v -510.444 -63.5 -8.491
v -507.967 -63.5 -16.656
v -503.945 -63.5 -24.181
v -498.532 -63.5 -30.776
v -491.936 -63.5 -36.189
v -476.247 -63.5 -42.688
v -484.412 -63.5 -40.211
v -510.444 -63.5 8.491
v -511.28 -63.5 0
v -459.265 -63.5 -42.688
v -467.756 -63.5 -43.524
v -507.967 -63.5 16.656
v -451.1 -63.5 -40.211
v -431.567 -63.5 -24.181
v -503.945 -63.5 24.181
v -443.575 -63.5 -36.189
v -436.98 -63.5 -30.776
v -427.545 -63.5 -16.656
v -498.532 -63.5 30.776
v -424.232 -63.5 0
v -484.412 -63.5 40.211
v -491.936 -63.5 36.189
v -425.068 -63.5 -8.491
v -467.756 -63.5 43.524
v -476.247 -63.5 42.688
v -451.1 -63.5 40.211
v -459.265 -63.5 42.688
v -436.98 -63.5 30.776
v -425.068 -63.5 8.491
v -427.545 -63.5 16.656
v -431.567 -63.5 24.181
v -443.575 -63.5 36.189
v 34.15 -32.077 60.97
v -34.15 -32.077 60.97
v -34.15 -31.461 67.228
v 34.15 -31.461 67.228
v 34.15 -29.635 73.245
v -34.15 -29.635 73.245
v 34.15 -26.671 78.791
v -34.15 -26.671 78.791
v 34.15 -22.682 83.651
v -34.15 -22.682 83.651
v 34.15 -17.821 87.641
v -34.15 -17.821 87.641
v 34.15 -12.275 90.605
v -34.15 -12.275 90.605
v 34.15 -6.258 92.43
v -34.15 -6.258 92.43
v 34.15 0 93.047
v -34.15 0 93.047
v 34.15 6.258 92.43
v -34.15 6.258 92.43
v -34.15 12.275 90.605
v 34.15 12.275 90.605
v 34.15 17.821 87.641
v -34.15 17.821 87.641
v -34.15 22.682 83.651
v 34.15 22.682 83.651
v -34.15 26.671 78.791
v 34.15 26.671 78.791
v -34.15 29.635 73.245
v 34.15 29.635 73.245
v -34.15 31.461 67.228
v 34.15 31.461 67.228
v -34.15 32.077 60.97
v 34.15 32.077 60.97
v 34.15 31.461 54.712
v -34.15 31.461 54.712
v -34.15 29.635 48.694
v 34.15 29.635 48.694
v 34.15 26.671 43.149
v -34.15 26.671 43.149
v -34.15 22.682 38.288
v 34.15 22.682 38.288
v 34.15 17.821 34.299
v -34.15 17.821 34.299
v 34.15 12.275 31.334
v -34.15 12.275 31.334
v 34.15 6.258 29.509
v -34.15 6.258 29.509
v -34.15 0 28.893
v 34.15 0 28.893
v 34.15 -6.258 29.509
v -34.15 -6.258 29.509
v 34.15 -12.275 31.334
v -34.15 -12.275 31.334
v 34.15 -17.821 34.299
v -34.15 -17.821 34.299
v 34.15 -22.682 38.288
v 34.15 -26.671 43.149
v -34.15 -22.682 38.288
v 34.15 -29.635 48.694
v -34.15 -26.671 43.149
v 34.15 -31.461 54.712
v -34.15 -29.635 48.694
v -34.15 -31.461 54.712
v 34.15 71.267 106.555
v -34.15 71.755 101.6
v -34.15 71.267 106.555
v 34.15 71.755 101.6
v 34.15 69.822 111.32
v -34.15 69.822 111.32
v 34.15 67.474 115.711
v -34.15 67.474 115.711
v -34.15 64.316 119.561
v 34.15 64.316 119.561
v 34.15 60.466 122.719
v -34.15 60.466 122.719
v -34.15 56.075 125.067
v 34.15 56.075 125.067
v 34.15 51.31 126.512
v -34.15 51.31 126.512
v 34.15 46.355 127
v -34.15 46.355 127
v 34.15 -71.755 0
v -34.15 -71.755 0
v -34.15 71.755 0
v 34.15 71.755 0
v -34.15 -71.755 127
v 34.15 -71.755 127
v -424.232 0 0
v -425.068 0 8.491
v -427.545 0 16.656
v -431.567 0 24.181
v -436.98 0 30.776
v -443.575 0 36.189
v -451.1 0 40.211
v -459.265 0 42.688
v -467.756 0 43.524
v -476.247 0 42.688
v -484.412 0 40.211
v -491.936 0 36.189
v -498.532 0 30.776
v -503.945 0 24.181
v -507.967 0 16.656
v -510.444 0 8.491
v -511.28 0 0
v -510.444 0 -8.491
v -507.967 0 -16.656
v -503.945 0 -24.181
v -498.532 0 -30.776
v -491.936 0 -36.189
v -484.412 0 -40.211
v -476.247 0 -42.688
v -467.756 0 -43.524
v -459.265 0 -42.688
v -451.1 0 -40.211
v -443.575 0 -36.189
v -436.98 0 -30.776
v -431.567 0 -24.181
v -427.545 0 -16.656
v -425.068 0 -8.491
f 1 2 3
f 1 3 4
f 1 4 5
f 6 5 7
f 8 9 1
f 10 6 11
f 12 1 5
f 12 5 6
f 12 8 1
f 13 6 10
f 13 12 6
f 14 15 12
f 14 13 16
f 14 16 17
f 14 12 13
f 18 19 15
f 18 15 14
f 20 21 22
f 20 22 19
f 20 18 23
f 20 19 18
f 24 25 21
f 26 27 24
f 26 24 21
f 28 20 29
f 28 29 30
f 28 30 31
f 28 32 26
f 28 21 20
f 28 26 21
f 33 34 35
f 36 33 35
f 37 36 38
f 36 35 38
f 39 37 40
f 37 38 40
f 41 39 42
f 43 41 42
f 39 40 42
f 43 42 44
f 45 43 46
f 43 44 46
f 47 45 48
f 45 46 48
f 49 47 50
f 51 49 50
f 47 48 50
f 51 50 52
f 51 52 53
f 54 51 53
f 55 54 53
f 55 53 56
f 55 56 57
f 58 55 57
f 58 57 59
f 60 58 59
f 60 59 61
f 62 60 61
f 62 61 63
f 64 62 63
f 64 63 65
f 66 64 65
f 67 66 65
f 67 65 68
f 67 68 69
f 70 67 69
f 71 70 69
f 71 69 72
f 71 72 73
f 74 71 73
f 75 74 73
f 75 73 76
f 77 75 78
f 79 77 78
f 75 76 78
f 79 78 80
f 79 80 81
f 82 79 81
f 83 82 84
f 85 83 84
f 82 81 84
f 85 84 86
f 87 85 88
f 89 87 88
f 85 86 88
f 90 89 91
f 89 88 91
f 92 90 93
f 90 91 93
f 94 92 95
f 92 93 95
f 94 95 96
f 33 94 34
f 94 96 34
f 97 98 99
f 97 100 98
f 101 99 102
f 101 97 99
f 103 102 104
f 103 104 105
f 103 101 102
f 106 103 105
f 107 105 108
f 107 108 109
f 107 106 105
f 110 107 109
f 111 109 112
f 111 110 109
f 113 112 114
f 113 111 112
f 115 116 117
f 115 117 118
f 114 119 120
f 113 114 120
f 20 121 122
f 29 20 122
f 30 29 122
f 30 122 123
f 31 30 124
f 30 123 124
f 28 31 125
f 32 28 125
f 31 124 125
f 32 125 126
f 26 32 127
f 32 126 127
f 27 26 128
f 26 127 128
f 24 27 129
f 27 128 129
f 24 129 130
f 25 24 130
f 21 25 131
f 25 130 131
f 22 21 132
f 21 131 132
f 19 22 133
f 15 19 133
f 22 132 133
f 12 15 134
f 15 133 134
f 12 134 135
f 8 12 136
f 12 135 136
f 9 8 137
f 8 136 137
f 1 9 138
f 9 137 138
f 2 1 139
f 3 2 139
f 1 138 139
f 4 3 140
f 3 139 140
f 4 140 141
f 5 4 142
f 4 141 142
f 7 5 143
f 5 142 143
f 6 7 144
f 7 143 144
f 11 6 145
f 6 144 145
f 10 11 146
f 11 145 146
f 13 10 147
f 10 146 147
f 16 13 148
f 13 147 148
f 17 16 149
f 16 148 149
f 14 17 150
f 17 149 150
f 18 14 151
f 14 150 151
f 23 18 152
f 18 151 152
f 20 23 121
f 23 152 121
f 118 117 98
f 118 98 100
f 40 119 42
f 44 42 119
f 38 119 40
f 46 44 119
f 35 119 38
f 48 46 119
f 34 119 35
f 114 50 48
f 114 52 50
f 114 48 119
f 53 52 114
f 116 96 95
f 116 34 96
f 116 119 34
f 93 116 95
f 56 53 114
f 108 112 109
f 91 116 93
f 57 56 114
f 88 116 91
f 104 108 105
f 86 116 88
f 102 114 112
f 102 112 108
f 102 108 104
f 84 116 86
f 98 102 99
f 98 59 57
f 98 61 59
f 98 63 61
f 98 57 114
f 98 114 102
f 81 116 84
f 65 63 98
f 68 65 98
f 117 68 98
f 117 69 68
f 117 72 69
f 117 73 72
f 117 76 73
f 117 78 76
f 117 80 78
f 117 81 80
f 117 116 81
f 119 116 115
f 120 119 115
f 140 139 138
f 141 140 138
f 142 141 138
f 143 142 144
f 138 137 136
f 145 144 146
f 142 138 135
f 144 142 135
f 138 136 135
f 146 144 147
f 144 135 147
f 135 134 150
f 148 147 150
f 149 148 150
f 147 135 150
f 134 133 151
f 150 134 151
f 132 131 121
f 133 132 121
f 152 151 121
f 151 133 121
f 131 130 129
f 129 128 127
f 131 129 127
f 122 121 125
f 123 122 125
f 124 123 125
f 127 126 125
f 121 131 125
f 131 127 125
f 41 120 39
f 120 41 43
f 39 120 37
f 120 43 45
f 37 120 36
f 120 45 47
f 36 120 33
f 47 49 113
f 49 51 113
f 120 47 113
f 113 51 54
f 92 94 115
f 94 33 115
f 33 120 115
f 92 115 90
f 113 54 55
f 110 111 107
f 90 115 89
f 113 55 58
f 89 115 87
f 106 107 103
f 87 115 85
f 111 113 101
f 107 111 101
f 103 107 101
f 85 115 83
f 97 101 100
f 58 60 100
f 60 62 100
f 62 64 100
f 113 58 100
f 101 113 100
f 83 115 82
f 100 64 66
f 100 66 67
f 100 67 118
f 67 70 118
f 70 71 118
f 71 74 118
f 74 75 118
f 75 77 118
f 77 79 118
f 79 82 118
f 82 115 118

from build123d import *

# Parameters (mm, degrees)
F0_W     = 68.3006
F0_H     = 143.51
F1_DEPTH = 127
F2_R     = 25.4
F3_R     = 32.076925
F4_DEPTH = 68.3016
F5_R     = 43.524008
F6_DEPTH = 63.5


with BuildPart() as f1:
    # F0 (on Top) → F1 (new body)
    with BuildSketch(Plane.XY):
        Rectangle(F0_W, F0_H)
    extrude(amount=F1_DEPTH)

    # F2
    f2_edges = [f1.edges().sort_by_distance(p)[0] for p in [
        (0, 71.755, 127),
    ]]
    fillet(f2_edges, radius=F2_R)

    # F3 (on face) → F4 (cut, through all)
    with BuildSketch(Plane(origin=(-34.1503, 0, 0), x_dir=(0, -1, 0), z_dir=(-1, 0, 0))):
        with Locations((0, 60.969625)):
            Circle(F3_R)
    extrude(amount=-F4_DEPTH, mode=Mode.SUBTRACT)


with BuildPart() as f6:
    # F5 (on Front) → F6 (new body)
    with BuildSketch(Plane.XZ):
        with Locations((-467.755824, 0)):
            Circle(F5_R)
    extrude(amount=F6_DEPTH)


solid = Compound([f1.part, f6.part])
